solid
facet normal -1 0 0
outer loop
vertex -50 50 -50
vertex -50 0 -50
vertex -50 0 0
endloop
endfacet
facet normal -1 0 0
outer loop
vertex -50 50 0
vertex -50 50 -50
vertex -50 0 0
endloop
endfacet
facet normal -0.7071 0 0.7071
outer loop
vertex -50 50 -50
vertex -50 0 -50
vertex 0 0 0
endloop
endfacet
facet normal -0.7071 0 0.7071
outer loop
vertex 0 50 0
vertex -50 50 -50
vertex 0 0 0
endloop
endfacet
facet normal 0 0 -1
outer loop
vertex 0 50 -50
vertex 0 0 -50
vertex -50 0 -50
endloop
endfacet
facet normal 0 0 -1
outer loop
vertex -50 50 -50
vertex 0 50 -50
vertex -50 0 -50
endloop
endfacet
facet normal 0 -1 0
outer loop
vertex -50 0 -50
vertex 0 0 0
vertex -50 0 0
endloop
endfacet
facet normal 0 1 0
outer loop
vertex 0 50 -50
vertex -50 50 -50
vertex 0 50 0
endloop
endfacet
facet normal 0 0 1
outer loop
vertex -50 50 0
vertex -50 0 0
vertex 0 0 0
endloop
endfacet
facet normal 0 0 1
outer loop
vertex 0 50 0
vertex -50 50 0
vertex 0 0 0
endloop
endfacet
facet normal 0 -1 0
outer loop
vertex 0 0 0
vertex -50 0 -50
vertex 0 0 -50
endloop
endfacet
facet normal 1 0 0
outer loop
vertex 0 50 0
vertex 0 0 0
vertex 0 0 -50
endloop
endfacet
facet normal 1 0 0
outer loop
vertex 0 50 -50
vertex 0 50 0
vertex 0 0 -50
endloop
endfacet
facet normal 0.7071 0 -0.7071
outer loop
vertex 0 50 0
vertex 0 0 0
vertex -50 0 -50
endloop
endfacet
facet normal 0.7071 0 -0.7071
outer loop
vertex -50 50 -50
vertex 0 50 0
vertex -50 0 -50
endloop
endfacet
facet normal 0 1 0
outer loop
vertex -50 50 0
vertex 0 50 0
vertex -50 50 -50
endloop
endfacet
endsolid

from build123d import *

# Parameters (mm, degrees)
EXTRUDE_1_DEPTH = 50
EXTRUDE_2_DEPTH = 50


with BuildPart() as part:
    # 草图1 → 凸台-拉伸1 (new body)
    with BuildSketch(Plane(origin=(0, 0, 0), x_dir=(1, 0, 0), z_dir=(0, 1, 0))):
        Polygon((0, 0), (0, 50), (-50, 50), align=None)
    extrude(amount=EXTRUDE_1_DEPTH)


with BuildPart() as body_2:
    # 草图2 → 凸台-拉伸2 (new body)
    with BuildSketch(Plane.XZ):
        Polygon((-50, -50), (-50, 0), (0, 0), align=None)
    extrude(amount=-EXTRUDE_2_DEPTH)


solid = Compound([part.part, body_2.part])
